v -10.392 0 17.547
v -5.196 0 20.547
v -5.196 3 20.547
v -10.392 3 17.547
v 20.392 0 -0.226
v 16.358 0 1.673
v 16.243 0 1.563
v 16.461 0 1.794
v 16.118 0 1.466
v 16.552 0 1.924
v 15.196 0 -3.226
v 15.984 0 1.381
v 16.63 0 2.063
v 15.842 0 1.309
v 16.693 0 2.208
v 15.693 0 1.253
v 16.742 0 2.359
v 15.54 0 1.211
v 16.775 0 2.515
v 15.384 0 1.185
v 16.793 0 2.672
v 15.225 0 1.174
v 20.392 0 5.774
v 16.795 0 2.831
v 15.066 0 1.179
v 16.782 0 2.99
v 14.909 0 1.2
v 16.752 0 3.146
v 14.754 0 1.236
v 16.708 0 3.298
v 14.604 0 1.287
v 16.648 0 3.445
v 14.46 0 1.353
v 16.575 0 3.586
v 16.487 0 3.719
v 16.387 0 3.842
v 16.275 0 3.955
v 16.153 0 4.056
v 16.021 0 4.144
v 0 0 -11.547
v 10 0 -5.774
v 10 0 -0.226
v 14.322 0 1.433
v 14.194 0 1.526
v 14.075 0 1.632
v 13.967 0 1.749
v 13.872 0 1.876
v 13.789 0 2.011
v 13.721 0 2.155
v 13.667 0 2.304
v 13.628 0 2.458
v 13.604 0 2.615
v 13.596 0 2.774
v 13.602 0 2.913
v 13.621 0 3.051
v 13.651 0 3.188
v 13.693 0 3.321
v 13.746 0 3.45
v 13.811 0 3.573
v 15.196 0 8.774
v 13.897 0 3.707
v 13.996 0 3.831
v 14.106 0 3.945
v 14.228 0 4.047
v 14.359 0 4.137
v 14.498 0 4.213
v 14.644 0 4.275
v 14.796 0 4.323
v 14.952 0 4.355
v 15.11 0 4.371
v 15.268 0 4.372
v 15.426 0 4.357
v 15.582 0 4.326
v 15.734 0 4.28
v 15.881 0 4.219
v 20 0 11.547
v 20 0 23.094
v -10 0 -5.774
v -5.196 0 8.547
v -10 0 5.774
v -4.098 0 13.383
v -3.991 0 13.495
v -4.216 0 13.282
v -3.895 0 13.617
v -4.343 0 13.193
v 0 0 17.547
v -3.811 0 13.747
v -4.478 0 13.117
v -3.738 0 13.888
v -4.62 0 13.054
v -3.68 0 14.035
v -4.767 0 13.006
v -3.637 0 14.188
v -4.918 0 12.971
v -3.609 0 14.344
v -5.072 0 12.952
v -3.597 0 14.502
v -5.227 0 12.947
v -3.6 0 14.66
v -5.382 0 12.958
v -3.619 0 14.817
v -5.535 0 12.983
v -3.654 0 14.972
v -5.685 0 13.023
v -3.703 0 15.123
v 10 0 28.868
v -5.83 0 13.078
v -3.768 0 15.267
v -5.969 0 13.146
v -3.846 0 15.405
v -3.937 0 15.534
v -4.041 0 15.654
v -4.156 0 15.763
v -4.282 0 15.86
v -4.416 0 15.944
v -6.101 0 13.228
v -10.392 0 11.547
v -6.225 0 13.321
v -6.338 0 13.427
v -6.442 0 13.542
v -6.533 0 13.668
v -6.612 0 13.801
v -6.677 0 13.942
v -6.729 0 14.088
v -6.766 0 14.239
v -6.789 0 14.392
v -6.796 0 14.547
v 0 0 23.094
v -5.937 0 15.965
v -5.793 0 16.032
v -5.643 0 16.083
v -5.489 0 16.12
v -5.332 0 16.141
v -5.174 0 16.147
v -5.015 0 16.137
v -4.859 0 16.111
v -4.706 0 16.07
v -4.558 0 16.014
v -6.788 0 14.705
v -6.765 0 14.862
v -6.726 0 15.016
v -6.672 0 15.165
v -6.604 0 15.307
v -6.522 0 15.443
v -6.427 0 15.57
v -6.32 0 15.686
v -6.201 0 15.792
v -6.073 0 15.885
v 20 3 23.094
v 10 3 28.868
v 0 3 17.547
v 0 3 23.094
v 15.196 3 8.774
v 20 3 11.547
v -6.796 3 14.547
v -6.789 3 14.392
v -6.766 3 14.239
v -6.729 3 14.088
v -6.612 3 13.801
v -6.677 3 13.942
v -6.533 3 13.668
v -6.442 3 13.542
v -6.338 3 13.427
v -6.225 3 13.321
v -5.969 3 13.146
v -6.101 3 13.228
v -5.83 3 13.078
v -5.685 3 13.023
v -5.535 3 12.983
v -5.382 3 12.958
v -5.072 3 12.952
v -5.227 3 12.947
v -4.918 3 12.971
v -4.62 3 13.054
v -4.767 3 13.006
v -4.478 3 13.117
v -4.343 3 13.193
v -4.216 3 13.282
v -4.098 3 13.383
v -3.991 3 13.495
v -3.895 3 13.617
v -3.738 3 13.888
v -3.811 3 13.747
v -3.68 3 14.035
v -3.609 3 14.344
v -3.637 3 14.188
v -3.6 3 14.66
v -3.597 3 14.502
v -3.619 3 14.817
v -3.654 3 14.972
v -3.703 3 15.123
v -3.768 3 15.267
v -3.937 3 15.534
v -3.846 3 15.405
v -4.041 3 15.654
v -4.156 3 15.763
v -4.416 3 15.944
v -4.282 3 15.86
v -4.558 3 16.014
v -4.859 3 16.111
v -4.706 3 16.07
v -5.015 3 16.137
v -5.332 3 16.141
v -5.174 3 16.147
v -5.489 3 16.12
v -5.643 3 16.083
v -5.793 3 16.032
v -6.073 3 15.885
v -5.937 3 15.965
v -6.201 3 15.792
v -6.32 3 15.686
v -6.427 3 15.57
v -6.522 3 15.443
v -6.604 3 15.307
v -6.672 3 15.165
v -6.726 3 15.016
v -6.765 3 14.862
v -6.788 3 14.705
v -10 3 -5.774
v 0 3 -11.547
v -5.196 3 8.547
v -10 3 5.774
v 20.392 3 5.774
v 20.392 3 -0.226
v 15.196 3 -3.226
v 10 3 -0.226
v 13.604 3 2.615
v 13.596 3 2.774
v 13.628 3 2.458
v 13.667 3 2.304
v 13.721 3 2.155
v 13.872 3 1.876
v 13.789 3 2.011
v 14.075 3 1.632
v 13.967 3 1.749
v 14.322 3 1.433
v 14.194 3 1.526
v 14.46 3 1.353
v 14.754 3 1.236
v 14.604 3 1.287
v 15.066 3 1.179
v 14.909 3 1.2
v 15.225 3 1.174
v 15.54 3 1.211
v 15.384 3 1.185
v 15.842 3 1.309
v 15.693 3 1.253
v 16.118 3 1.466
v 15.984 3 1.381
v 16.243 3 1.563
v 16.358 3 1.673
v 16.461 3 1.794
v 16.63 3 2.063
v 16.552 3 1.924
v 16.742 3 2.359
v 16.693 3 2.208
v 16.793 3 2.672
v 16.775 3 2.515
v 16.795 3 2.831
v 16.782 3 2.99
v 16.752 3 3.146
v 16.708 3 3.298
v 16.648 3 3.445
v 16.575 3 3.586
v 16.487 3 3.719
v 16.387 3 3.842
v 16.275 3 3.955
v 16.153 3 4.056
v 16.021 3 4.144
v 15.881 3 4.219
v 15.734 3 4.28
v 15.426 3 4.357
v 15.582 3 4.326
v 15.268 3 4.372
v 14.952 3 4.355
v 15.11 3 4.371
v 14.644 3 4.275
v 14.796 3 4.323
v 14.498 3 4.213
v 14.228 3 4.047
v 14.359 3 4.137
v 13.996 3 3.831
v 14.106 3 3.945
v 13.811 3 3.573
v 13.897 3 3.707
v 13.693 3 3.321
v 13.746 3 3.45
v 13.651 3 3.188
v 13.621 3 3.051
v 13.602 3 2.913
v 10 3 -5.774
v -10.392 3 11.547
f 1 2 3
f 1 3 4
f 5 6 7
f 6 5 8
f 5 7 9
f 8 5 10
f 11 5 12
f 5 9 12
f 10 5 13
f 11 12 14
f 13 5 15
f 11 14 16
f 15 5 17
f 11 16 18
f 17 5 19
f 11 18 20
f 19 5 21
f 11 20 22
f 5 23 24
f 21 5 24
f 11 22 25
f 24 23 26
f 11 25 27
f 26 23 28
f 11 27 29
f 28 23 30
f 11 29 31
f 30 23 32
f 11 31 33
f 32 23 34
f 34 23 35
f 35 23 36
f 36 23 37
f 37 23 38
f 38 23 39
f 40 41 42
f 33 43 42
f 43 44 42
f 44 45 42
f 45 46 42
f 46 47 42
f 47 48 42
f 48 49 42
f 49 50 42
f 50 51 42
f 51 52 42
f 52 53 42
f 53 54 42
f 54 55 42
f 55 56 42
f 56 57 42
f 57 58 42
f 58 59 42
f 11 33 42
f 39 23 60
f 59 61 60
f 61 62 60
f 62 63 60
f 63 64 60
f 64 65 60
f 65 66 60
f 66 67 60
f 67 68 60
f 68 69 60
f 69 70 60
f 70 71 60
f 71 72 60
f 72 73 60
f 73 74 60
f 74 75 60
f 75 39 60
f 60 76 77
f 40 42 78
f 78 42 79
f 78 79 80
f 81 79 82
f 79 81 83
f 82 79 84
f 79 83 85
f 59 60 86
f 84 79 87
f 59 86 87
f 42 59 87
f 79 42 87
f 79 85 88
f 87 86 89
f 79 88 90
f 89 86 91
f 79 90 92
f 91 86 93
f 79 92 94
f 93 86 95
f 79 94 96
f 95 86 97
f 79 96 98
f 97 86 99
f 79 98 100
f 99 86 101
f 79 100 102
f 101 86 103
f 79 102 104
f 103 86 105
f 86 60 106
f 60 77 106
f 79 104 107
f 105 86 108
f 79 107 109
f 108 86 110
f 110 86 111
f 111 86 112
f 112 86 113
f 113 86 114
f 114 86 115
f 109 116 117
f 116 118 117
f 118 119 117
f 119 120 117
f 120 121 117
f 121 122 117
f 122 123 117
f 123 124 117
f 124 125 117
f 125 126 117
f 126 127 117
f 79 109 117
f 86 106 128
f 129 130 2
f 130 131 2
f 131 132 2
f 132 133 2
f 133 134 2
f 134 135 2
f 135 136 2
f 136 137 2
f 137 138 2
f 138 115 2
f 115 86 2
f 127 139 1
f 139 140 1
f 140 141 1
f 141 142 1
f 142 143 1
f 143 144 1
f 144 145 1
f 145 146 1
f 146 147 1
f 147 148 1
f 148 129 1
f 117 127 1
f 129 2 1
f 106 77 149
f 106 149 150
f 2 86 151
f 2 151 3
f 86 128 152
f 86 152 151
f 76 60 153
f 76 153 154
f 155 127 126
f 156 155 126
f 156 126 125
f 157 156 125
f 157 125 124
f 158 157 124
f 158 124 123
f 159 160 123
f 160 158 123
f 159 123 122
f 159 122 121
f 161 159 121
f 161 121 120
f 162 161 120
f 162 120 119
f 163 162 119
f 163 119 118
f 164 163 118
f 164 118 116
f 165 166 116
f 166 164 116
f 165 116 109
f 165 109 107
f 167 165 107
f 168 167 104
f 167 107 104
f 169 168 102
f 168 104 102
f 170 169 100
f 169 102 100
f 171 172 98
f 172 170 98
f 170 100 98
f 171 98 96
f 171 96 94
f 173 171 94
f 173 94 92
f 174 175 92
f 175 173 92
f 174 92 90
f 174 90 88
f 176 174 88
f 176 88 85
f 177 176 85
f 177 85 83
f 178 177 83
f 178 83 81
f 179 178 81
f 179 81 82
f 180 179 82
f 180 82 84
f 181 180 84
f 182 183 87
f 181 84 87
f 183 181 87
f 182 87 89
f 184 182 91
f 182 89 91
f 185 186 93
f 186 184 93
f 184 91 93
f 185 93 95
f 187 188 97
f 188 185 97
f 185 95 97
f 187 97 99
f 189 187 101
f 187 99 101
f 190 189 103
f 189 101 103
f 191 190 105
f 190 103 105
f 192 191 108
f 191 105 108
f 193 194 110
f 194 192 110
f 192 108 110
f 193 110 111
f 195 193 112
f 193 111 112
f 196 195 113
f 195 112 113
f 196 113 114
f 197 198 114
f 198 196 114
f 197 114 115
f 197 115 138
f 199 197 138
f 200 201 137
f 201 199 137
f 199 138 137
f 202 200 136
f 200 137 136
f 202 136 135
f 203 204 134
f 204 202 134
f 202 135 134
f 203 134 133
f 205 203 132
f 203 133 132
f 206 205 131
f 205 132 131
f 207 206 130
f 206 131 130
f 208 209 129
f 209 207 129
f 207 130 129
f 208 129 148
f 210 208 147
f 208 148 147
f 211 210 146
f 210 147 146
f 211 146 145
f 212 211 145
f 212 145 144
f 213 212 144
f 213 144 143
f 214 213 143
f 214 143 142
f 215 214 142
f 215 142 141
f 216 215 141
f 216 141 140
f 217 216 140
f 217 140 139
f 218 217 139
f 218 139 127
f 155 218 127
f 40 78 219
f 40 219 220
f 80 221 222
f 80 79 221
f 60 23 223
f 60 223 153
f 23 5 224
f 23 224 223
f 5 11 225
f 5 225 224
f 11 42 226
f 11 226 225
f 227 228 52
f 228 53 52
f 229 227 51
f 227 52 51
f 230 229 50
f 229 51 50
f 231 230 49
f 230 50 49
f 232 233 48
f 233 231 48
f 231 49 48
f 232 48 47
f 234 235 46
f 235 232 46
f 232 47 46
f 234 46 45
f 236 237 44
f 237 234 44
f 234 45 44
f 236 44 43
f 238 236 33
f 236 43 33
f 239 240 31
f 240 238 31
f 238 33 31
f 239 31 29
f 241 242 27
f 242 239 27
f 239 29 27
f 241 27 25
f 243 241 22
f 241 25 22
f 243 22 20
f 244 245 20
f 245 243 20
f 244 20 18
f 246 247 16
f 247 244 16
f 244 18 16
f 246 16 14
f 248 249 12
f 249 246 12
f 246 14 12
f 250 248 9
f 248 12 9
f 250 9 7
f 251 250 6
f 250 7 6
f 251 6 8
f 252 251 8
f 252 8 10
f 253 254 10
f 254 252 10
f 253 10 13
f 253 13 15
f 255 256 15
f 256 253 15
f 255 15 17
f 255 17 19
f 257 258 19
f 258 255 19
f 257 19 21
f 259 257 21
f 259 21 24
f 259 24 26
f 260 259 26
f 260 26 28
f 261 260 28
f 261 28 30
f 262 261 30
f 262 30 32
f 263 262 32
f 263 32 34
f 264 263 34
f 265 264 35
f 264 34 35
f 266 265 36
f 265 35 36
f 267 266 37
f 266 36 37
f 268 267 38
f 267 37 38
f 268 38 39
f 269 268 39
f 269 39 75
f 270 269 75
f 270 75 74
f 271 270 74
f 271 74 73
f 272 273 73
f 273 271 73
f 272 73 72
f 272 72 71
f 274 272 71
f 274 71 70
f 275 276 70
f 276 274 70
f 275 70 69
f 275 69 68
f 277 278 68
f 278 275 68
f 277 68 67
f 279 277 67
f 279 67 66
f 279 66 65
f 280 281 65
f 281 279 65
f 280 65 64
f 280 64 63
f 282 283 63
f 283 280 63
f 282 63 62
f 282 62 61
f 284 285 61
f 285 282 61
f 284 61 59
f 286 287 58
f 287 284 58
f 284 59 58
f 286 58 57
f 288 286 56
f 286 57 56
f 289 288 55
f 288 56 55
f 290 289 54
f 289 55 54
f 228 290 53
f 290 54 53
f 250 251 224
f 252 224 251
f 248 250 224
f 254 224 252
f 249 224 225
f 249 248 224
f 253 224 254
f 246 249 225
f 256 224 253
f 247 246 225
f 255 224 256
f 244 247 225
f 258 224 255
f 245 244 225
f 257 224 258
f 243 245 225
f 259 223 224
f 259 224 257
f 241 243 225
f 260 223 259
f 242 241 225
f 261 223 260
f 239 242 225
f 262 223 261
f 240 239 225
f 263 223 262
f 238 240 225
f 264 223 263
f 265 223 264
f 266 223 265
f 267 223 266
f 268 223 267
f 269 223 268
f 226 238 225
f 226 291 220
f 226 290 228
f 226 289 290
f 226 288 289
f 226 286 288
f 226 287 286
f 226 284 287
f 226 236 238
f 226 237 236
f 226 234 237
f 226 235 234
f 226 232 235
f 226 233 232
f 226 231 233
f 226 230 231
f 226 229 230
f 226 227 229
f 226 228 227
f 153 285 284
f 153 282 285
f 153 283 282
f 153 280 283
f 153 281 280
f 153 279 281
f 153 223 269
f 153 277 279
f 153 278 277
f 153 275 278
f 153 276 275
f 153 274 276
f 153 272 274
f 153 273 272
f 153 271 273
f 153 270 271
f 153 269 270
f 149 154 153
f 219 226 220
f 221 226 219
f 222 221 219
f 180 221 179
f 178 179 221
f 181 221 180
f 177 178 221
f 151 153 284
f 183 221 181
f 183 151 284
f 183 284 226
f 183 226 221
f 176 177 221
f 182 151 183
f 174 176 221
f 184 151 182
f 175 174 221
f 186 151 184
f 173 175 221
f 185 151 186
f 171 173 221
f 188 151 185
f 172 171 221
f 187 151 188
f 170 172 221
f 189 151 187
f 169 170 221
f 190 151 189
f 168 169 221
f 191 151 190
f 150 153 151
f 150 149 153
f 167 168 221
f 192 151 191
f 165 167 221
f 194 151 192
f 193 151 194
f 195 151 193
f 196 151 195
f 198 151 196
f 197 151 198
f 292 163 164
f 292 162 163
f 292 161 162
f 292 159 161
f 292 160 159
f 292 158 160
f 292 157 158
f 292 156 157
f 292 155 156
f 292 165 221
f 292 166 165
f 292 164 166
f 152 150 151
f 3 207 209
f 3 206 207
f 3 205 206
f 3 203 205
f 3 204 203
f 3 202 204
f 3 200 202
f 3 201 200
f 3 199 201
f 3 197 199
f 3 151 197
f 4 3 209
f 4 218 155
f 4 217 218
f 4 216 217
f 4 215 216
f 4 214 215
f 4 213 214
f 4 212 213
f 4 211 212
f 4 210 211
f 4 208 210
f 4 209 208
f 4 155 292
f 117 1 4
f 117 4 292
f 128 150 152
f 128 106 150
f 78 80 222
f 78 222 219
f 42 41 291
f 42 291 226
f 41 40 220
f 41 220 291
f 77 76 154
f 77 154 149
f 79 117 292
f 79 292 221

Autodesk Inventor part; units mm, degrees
ref_plane "YZ Plane" through (0, 0, 0) normal (1, 0, 0) x (0, 1, 0)
ref_plane "XZ Plane" through (0, 0, 0) normal (0, 1, 0) x (-1, 0, 0)
ref_plane "XY Plane" through (0, 0, 0) normal (0, 0, 1) x (1, 0, 0)
sketch "Sketch1" plane through (0, 0, 0) normal (0, 1, 0) x (-1, 0, 0)
  line L0 (0, 11.547) -> (10, 5.7735)
  line L1 (10, 5.7735) -> (10, -5.7735)
  line L2 (10, -5.7735) -> (0, -11.547)
  line L3 (0, -11.547) -> (-10, -5.7735)
  line L4 (-10, -5.7735) -> (-10, 5.7735)
  line L5 (-10, 5.7735) -> (0, 11.547)
  line L6 (-10, 5.7735) -> (-20, 11.547)
  line L7 (-20, 11.547) -> (-20, 23.094)
  line L8 (-20, 23.094) -> (-10, 28.8675)
  line L9 (-10, 28.8675) -> (0, 23.094)
  line L10 (0, 23.094) -> (0, 11.547)
  line L11 (0, 11.547) -> (-10, 5.7735)
  circle A0 centre (-15.1962, 2.7735) radius 1.6
  circle A1 centre (5.1962, 14.547) radius 1.6
  line L12 (0, 11.547) -> (5.1962, 14.547)
  line L13 (-10, 5.7735) -> (-15.1962, 2.7735)
  line L14 (-10, 5.7735) -> (-10, -0.2265)
  line L15 (-10, -0.2265) -> (-15.1962, -3.2265)
  line L16 (-15.1962, -3.2265) -> (-20.3923, -0.2265)
  line L17 (-20.3923, -0.2265) -> (-20.3923, 5.7735)
  line L18 (-20.3923, 5.7735) -> (-15.1962, 8.7735)
  line L19 (-15.1962, 8.7735) -> (-10, 5.7735)
  line L20 (0, 11.547) -> (0, 17.547)
  line L21 (0, 17.547) -> (5.1962, 20.547)
  line L22 (5.1962, 20.547) -> (10.3923, 17.547)
  line L23 (10.3923, 17.547) -> (10.3923, 11.547)
  line L24 (10.3923, 11.547) -> (5.1962, 8.547)
  line L25 (5.1962, 8.547) -> (0, 11.547)
  dimension "d26" = 3.2
  dimension "d27" = 3.2
  dimension "d28" = 6
  dimension "d29" = 6
extrude "Extrusion1" add sketch "Sketch1" along normal blind 3
properties part number "Dribbler Plate" material "Polycarbonate, Smoke"
